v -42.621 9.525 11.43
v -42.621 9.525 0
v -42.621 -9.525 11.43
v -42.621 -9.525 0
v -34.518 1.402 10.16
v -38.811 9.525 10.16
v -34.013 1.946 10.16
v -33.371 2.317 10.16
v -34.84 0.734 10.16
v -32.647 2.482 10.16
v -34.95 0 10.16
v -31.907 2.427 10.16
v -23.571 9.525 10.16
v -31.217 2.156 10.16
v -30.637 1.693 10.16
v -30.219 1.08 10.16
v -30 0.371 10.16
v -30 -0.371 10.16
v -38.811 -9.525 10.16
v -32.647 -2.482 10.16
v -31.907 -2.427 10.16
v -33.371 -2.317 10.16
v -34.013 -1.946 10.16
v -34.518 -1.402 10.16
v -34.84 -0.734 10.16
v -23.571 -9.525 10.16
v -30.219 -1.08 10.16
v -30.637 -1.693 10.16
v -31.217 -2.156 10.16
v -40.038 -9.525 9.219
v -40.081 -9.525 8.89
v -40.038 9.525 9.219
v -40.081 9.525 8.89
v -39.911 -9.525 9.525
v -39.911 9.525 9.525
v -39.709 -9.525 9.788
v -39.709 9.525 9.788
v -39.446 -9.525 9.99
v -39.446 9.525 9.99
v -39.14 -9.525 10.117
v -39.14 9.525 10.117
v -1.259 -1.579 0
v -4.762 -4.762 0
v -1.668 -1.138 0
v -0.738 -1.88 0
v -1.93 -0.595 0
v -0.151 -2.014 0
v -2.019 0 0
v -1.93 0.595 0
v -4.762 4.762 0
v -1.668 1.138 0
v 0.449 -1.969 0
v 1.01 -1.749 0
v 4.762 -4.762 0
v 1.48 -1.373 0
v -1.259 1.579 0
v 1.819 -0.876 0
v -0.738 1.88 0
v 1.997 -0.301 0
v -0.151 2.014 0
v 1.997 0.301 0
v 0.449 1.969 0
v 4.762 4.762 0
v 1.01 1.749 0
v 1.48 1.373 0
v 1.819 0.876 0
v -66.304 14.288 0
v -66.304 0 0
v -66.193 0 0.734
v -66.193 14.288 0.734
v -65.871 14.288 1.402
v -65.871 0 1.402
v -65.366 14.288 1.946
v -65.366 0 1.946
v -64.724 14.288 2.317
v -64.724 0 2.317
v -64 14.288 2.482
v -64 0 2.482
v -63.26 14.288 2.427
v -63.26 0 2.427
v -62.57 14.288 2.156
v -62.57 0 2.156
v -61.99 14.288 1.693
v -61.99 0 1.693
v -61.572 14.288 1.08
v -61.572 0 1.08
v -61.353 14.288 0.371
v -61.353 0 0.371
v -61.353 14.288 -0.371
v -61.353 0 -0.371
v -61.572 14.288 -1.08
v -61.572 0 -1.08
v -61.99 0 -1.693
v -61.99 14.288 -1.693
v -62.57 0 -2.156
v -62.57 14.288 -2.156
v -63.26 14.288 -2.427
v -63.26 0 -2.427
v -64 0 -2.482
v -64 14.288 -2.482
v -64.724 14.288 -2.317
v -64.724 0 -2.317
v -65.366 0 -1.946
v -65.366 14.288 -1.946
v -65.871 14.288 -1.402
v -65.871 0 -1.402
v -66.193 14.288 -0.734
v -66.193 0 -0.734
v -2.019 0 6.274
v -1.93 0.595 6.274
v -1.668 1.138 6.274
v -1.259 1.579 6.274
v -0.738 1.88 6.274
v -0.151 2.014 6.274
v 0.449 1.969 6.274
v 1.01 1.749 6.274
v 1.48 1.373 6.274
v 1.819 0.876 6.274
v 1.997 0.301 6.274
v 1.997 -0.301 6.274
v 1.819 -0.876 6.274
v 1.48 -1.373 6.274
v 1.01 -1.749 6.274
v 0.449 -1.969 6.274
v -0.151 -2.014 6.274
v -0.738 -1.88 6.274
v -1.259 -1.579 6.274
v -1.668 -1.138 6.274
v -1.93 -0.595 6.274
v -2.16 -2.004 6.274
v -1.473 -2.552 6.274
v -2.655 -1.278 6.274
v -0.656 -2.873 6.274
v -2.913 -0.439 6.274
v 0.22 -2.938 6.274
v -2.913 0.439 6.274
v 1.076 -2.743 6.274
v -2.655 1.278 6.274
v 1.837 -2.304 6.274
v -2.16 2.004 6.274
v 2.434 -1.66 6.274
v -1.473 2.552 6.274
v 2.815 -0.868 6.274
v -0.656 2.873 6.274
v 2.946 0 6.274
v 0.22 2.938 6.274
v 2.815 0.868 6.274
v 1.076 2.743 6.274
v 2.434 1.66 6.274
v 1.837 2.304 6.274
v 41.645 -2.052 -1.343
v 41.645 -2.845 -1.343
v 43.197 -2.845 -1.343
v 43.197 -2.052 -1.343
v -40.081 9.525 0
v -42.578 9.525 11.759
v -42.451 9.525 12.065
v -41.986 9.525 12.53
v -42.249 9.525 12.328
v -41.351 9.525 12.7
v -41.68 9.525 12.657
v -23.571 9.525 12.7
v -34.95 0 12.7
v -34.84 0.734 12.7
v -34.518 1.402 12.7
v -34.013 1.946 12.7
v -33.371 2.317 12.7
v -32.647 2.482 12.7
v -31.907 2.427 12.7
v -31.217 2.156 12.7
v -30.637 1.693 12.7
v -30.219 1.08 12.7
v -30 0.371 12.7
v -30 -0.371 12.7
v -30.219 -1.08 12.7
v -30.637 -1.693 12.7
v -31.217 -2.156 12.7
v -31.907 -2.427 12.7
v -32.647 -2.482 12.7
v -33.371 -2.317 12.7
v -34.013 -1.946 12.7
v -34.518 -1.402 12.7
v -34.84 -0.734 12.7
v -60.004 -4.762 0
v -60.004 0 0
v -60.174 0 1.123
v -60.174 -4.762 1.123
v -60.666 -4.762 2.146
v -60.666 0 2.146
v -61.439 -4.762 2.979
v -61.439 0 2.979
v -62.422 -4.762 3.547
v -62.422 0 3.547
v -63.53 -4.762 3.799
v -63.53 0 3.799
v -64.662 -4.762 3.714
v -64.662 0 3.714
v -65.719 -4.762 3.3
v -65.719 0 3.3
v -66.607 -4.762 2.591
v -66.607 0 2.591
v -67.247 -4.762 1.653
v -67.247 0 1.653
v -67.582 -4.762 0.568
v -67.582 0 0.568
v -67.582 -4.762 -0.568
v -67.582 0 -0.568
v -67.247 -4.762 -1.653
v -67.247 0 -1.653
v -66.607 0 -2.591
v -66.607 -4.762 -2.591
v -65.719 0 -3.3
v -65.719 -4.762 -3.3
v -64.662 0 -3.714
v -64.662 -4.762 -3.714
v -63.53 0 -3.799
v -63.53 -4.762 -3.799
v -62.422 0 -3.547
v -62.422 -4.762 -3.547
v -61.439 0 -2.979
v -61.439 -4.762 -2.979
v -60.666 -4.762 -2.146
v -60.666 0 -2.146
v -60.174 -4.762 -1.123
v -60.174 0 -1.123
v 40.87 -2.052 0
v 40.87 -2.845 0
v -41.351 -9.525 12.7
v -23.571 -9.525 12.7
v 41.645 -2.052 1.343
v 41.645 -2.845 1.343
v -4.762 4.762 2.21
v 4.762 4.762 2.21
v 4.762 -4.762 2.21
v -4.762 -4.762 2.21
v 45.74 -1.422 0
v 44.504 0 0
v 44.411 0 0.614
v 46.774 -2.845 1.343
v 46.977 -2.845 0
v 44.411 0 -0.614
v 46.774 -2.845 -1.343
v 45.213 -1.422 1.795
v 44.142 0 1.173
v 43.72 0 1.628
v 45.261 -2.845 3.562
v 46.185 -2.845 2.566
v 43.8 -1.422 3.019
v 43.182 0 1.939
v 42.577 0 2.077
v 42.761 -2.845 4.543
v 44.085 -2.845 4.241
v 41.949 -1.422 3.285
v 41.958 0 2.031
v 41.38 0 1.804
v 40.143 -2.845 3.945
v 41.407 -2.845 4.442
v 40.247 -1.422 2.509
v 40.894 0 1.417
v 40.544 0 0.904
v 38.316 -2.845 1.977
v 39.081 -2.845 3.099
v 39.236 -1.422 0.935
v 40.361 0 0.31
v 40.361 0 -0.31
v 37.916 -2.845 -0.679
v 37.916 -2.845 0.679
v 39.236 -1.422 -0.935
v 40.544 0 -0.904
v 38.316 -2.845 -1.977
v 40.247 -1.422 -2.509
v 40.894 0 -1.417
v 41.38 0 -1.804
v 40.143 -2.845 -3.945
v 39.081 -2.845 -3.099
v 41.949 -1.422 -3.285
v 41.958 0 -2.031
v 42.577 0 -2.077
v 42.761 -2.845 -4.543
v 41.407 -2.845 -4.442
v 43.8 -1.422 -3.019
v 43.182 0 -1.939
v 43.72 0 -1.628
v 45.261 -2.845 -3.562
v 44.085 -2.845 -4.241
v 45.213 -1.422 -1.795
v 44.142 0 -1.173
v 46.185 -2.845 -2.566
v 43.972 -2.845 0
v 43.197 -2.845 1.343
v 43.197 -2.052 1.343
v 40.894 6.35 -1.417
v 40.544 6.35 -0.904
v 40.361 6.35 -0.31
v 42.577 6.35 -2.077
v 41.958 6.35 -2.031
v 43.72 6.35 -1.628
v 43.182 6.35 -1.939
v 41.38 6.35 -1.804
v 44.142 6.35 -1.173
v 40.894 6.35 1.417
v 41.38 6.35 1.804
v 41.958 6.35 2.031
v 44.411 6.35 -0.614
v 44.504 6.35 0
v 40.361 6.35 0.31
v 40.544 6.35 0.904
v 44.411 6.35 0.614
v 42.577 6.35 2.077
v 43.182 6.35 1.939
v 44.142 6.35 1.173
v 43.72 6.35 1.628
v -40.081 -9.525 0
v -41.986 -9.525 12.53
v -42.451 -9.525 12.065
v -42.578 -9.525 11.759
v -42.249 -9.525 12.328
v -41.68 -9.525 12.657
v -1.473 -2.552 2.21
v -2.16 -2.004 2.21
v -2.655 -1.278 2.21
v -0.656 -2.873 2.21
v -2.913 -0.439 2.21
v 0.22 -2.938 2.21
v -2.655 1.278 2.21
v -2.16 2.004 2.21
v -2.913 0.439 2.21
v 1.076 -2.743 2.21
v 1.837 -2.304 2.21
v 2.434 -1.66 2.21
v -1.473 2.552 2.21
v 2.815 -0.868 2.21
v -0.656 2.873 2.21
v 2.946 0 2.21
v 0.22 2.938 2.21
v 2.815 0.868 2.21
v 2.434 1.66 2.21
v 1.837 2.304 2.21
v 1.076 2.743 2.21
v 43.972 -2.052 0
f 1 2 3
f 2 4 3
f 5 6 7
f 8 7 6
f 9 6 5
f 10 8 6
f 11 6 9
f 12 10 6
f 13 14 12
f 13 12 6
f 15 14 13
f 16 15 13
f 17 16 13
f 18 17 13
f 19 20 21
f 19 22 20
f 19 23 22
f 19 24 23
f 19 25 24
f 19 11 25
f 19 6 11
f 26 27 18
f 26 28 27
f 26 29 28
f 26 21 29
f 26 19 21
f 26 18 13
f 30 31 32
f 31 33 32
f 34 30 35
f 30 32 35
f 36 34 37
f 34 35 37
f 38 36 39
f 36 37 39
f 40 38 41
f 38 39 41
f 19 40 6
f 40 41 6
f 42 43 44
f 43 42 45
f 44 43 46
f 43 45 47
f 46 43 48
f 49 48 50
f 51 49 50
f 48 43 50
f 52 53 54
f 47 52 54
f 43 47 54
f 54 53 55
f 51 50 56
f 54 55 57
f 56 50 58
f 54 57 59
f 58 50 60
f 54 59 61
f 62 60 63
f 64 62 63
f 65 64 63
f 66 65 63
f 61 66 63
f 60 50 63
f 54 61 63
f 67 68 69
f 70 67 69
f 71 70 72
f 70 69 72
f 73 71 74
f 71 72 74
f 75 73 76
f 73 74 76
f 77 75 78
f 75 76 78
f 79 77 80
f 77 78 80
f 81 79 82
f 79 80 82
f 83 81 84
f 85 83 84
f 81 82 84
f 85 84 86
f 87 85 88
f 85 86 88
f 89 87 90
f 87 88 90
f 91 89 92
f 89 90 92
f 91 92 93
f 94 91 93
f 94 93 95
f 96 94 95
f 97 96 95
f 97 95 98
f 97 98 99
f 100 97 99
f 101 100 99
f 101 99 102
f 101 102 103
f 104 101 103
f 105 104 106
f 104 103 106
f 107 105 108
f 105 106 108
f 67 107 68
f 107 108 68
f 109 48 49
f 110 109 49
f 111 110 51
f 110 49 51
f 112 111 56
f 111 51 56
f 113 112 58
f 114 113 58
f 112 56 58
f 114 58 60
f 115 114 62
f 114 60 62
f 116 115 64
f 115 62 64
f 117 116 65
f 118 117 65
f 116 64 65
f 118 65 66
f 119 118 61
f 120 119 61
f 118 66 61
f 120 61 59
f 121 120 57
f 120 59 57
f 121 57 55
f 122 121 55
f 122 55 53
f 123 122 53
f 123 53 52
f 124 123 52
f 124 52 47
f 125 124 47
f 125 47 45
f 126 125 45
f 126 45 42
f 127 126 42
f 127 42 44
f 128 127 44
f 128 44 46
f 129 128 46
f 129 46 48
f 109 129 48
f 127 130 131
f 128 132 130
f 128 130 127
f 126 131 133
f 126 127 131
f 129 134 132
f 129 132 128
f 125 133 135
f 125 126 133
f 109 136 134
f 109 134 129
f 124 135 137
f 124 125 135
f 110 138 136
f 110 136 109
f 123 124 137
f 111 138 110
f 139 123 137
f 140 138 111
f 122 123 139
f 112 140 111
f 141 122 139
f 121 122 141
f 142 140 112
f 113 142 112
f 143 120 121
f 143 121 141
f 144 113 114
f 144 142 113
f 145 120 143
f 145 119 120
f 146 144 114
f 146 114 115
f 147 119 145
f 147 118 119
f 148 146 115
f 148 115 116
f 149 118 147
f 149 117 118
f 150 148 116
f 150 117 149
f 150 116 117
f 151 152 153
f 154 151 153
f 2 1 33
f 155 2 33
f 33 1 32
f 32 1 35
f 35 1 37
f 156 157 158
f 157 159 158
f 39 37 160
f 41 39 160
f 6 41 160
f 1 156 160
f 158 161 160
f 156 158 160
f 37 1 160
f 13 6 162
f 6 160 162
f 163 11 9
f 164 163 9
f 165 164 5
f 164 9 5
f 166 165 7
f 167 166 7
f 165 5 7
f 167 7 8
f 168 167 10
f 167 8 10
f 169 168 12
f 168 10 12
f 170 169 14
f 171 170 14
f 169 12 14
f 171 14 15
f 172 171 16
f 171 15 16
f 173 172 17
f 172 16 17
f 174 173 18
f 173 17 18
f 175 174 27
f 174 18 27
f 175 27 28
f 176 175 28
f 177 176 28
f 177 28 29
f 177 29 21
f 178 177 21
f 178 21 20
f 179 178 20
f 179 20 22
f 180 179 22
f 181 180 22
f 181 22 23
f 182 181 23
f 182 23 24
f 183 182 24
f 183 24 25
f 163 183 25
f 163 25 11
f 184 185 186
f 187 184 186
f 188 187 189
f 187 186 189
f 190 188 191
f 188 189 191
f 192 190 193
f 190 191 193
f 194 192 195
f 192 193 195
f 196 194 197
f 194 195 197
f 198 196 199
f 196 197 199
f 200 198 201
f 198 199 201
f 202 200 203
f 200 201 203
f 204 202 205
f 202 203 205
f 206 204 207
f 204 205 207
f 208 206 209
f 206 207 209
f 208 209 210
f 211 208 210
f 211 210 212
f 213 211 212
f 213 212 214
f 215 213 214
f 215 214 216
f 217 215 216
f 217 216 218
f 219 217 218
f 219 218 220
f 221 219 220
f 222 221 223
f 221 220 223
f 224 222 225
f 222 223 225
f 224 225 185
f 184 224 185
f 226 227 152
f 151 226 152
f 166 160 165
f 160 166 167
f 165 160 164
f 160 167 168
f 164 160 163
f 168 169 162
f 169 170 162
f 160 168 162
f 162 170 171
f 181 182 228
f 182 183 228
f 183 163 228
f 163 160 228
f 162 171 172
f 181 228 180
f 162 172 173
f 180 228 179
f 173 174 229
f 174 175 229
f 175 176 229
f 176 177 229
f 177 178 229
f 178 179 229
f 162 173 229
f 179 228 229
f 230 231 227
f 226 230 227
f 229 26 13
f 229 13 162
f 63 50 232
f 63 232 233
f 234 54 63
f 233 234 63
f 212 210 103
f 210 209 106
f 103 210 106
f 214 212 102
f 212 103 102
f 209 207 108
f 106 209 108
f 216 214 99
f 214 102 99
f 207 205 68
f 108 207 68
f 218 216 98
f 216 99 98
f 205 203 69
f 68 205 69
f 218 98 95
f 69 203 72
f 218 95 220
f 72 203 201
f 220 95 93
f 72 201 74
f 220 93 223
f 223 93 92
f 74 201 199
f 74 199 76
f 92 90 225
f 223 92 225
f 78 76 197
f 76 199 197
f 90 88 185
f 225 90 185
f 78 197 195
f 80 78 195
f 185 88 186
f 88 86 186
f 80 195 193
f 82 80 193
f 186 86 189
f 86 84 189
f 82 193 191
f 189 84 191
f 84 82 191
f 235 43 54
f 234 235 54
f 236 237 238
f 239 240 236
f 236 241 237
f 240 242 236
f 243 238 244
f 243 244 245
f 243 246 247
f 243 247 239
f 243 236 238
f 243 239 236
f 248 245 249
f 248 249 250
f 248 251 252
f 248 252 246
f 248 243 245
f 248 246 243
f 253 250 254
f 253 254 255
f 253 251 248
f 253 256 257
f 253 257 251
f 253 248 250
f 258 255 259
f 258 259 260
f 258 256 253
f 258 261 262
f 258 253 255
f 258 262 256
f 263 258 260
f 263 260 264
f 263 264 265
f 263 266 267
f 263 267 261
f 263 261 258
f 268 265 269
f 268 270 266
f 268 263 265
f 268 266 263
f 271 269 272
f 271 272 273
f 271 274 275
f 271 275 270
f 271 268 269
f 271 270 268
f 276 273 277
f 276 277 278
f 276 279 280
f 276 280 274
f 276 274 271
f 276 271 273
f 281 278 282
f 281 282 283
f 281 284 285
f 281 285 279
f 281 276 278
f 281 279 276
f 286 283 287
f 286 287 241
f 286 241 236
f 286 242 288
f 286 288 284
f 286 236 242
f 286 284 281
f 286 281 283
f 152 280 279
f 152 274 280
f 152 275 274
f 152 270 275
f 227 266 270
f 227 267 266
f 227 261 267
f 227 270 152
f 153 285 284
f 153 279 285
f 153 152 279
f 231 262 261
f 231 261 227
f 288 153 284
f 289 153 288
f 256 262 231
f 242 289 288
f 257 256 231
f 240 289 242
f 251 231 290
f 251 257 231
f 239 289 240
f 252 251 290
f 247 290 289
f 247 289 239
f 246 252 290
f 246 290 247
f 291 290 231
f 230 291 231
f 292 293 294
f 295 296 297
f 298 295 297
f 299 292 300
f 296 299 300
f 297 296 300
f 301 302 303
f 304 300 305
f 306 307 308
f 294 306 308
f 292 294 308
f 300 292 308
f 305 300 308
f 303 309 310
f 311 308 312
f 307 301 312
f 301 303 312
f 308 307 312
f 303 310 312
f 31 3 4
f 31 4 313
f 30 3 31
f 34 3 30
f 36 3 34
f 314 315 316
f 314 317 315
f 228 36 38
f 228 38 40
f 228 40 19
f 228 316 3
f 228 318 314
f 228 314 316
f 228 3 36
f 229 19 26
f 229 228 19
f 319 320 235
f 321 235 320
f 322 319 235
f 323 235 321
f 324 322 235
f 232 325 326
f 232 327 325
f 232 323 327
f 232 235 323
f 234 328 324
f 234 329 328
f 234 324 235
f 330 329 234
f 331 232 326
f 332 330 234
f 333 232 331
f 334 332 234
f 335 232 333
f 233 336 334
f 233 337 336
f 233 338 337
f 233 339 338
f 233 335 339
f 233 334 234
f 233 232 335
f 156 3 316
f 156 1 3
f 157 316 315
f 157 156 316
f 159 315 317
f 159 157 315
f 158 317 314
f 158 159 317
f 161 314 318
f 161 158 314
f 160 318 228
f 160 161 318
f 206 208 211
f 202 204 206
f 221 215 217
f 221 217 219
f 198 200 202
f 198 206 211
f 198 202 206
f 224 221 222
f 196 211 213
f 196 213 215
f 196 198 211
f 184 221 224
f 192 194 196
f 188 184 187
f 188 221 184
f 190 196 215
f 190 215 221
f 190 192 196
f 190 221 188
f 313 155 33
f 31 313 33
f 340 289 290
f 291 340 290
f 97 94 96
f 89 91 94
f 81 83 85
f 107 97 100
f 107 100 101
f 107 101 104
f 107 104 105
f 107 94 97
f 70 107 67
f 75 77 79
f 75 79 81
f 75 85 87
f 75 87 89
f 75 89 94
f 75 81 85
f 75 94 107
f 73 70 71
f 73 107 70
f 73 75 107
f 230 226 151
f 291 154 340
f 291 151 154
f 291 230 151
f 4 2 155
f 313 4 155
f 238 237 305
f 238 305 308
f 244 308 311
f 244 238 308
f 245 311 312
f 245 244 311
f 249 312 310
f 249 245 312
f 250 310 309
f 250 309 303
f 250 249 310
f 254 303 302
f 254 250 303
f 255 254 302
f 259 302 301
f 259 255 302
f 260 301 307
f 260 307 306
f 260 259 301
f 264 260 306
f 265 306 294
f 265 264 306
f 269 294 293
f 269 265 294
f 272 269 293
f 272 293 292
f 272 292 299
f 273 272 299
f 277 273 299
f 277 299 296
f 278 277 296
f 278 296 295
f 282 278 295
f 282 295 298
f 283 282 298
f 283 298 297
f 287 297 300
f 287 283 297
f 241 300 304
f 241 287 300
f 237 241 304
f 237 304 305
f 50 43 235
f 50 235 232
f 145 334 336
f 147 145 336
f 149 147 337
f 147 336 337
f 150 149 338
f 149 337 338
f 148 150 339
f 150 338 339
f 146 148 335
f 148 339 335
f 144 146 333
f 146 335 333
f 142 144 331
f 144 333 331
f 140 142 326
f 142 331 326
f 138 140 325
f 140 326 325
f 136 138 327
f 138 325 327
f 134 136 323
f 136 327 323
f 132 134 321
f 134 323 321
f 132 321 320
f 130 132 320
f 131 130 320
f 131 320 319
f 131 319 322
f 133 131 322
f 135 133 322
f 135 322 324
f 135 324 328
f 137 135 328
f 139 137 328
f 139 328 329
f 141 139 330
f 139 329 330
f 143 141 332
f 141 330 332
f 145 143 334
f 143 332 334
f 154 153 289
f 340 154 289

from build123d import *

# Parameters (mm, degrees)
F0_W           = 9.525
F0_H           = 9.525
F1_DEPTH       = 2.2098
F2_R           = 2.9464
F3_DEPTH       = 4.064
F5_D           = 4.0386
F6_W           = 19.05
F6_H           = 12.7
F7_DEPTH       = 9.525
F8_W           = 16.51
F8_H           = 10.16
F9_DEPTH       = 19.051
F10_R          = 1.27
F12_D          = 4.9784
F13_R          = 3.81
F14_DEPTH      = 4.7625
F15_R          = 2.4892
F16_DEPTH      = 14.2875
F17_R          = 2.0828
F18_DEPTH      = 2.8448
F18_TAPER      = -41
F18_DEPTH_BACK = 6.35
F20_DEPTH      = 0.79248


with BuildPart() as f1:
    # F0 (on Top) → F1 (new body)
    with BuildSketch(Plane.XY):
        Rectangle(F0_W, F0_H)
    extrude(amount=F1_DEPTH)

    # F2 (on face) → F3 (join)
    with BuildSketch(Plane.XY.offset(2.2098)):
        Circle(F2_R)
    extrude(amount=F3_DEPTH)

    # F5 (through all)
    with Locations(Plane.XY.offset(6.2738)):
        with Locations((0, 0)):
            Hole(F5_D / 2)


with BuildPart() as f7:
    # F6 (on Front) → F7 (new body, symmetric)
    with BuildSketch(Plane.XZ):
        with Locations((-33.0962524428, 6.35)):
            Rectangle(F6_W, F6_H)
    extrude(amount=F7_DEPTH, both=True)

    # F8 (on face) → F9 (cut, through all)
    with BuildSketch(Plane.XZ.offset(9.525)):
        with Locations((-31.8262524428, 5.08)):
            Rectangle(F8_W, F8_H)
    extrude(amount=-F9_DEPTH, mode=Mode.SUBTRACT)

    # F10
    f10_edges = [f7.edges().sort_by_distance(p)[0] for p in [
        (-42.621252, 0, 12.7),
        (-40.081252, 0, 10.16),
    ]]
    fillet(f10_edges, radius=F10_R)

    # F12 (through all)
    with Locations(Plane.XY.offset(12.7)):
        with Locations((-32.4612524428, 0)):
            Hole(F12_D / 2)


with BuildPart() as f14:
    # F13 (on Front) → F14 (new body)
    with BuildSketch(Plane.XZ):
        with Locations((-63.8143345714, 0)):
            Circle(F13_R)
    extrude(amount=F14_DEPTH)

    # F15 (on face) → F16 (join)
    with BuildSketch(Plane(origin=(0, 0, 0), x_dir=(-1, 0, 0), z_dir=(0, 1, 0))):
        with Locations((63.8143345714, 0)):
            Circle(F15_R)
    extrude(amount=F16_DEPTH)


with BuildPart() as f18:
    # F17 (on Front) → F18 (new body, two sides)
    with BuildSketch(Plane.XZ) as f18_sk:
        with Locations((42.4209682934, 0)):
            Circle(F17_R)
    extrude(amount=F18_DEPTH, taper=F18_TAPER)
    extrude(f18_sk.sketch, amount=-F18_DEPTH_BACK)

    # F19 (on face) → F20 (cut)
    with BuildSketch(Plane.XZ.offset(2.8448)):
        Polygon((43.1966357279, -1.3434954063), (43.9723031624, 0), (43.1966357279, 1.3434954063), (41.645300859, 1.3434954063), (40.8696334245, 0), (41.645300859, -1.3434954063), align=None)
    extrude(amount=-F20_DEPTH, mode=Mode.SUBTRACT)


solid = Compound([f1.part, f7.part, f14.part, f18.part])
